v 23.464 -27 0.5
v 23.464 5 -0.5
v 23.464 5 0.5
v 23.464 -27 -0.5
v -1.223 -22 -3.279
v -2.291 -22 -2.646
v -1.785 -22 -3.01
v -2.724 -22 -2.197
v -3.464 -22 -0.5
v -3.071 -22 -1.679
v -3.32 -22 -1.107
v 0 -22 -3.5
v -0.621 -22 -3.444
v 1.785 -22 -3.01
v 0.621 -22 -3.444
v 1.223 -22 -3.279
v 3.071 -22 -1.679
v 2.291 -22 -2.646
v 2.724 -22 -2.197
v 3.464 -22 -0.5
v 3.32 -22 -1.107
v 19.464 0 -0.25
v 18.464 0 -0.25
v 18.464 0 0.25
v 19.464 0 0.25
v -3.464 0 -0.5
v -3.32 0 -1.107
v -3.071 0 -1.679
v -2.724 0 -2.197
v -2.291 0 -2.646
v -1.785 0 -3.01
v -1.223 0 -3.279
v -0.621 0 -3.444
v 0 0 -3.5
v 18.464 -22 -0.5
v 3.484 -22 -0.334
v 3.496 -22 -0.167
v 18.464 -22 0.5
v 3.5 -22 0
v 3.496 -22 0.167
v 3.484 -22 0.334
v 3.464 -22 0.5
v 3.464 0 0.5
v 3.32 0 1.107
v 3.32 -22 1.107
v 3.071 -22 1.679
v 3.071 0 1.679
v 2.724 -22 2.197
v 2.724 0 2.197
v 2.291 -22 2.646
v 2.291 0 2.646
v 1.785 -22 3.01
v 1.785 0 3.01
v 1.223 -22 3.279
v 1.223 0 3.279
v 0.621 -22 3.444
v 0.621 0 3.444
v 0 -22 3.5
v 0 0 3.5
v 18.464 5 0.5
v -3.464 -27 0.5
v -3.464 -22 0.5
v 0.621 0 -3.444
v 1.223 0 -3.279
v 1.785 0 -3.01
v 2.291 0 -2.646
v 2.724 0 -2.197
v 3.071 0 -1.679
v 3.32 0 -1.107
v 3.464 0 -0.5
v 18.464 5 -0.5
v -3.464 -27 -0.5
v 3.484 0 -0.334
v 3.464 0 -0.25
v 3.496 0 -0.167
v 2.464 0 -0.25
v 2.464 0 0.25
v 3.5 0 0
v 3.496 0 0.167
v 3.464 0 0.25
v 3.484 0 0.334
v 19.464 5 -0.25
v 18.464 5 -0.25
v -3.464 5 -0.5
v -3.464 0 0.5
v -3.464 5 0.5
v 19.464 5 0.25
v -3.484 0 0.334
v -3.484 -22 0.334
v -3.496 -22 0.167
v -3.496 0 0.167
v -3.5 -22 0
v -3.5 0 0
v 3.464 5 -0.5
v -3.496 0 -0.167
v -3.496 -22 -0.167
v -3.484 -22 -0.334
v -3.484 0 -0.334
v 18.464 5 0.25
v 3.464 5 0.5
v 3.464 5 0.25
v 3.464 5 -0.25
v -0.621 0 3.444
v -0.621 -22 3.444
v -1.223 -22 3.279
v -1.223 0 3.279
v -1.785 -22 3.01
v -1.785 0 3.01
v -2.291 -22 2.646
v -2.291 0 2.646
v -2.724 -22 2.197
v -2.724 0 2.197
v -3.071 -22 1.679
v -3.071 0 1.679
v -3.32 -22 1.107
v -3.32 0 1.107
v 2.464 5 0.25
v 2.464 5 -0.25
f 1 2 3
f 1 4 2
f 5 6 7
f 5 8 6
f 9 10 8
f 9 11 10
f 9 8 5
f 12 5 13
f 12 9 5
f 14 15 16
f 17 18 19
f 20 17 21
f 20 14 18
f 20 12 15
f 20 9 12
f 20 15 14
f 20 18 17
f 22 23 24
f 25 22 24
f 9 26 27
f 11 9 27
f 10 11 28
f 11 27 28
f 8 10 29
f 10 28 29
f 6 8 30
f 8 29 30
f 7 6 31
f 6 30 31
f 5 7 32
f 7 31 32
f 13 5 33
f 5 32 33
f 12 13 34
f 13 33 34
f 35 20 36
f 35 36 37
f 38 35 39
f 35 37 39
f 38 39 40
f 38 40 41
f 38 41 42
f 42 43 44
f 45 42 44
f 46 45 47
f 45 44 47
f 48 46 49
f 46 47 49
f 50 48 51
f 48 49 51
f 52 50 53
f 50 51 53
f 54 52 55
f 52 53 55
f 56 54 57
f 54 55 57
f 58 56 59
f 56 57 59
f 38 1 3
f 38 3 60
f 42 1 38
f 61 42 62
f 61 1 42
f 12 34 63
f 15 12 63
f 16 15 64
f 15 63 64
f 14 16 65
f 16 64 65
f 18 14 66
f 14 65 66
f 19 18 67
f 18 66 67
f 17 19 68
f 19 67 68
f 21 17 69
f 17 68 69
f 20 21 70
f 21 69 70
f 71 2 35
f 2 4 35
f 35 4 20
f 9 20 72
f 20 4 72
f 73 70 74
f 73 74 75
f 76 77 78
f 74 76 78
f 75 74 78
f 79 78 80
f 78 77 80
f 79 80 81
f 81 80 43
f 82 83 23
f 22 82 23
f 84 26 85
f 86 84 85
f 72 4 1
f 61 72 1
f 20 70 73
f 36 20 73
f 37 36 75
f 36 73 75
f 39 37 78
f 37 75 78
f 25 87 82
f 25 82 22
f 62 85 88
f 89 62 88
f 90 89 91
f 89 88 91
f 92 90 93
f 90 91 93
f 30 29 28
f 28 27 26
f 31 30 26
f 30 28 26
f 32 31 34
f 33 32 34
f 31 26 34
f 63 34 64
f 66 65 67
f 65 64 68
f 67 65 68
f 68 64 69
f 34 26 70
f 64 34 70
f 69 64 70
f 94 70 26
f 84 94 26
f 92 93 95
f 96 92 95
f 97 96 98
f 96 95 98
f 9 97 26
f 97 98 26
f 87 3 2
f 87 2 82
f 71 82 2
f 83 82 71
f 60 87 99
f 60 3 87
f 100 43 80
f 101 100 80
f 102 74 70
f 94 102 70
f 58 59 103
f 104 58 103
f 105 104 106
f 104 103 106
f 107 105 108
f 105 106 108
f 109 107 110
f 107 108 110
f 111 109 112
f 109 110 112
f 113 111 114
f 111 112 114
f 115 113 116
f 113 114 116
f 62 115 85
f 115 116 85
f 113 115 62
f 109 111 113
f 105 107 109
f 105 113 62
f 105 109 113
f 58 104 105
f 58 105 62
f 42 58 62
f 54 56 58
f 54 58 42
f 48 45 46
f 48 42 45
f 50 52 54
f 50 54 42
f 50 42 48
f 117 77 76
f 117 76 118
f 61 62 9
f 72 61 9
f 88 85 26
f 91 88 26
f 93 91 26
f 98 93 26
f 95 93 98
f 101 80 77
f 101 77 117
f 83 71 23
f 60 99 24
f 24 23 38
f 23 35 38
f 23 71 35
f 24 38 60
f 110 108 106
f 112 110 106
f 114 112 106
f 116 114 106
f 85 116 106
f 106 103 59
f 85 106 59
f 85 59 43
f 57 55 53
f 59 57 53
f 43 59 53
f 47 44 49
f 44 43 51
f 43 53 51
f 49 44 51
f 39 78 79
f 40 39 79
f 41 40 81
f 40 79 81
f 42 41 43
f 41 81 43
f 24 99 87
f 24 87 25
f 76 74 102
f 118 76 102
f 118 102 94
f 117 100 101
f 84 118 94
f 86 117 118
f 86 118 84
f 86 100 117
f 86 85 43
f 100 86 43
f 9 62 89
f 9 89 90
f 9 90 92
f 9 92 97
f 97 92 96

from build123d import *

# Parameters (mm, degrees)
F1_DEPTH  = 22
F3_DEPTH  = 5
F5_DEPTH  = 5
F7_DEPTH  = 25
F8_DEPTH  = 20
F9_W      = 5
F9_H      = 1
F10_DEPTH = 27
F11_W     = 5
F11_H     = 0.5
F12_DEPTH = 1
F13_W     = 5
F13_H     = 0.5
F14_DEPTH = 1


with BuildPart() as f1:
    # F0 (on Front) → F1 (new body)
    with BuildSketch(Plane.XZ):
        with BuildLine():
            ThreePointArc((0, -3.5), (2.4748737342, -2.4748737342), (3.5, 0))
            ThreePointArc((3.5, 0), (2.4748737342, 2.4748737342), (0, 3.5))
            ThreePointArc((0, 3.5), (-2.4748737342, 2.4748737342), (-3.5, 0))
            ThreePointArc((-3.5, 0), (-2.4748737342, -2.4748737342), (0, -3.5))
        make_face()
        with BuildLine():
            ThreePointArc((-3.5, 0), (-2.4748737342, 2.4748737342), (0, 3.5))
            Line((0, 3.5), (-3.5, 3.5))
            Line((-3.5, 3.5), (-3.5, 0))
        make_face()
        with BuildLine():
            Line((-3.5, -3.5), (0, -3.5))
            ThreePointArc((0, -3.5), (-2.4748737342, -2.4748737342), (-3.5, 0))
            Line((-3.5, 0), (-3.5, -3.5))
        make_face()
        with BuildLine():
            Line((3.5, -3.5), (3.5, 0))
            ThreePointArc((3.5, 0), (2.4748737342, -2.4748737342), (0, -3.5))
            Line((0, -3.5), (3.5, -3.5))
        make_face()
        with BuildLine():
            ThreePointArc((0, 3.5), (2.4748737342, 2.4748737342), (3.5, 0))
            Line((3.5, 0), (3.5, 3.5))
            Line((3.5, 3.5), (0, 3.5))
        make_face()
    extrude(amount=F1_DEPTH)

    # F2 (on face) → F3 (join)
    with BuildSketch(Plane.XZ.offset(22)):
        Polygon((3.4641016151, -0.5), (3.4641016151, 0.5), (0, 0.5), (-3.4641016151, 0.5), (-3.4641016151, -0.5), align=None)
    extrude(amount=F3_DEPTH)

    # F4 (on face) → F5 (join)
    with BuildSketch(Plane(origin=(0, 0, 0), x_dir=(-1, 0, 0), z_dir=(0, 1, 0))):
        Polygon((3.4641016151, -0.5), (3.4641016151, 0.5), (0, 0.5), (-3.4641016151, 0.5), (-3.4641016151, -0.5), (0, -0.5), align=None)
    extrude(amount=F5_DEPTH)

    # F6 (on face) → F7 (cut)
    with BuildSketch(Plane(origin=(0, 0, 0), x_dir=(-1, 0, 0), z_dir=(0, 1, 0))):
        with BuildLine():
            ThreePointArc((-3.4641016151, 0.5), (-2.2912878475, 2.6457513111), (0, 3.5))
            Line((0, 3.5), (-3.5, 3.5))
            Line((-3.5, 3.5), (-3.5, 0))
            ThreePointArc((-3.5, 0), (-3.491013868, 0.2506435188), (-3.4641016151, 0.5))
        make_face()
        with BuildLine():
            ThreePointArc((3.4641016151, 0.5), (3.491013868, 0.2506435188), (3.5, 0))
            Line((3.5, 0), (3.5, 3.5))
            Line((3.5, 3.5), (0, 3.5))
            ThreePointArc((0, 3.5), (2.2912878475, 2.6457513111), (3.4641016151, 0.5))
        make_face()
        with BuildLine():
            Line((-3.5, -3.5), (0, -3.5))
            ThreePointArc((0, -3.5), (-2.2912878475, -2.6457513111), (-3.4641016151, -0.5))
            ThreePointArc((-3.4641016151, -0.5), (-3.491013868, -0.2506435188), (-3.5, 0))
            Line((-3.5, 0), (-3.5, -3.5))
        make_face()
        with BuildLine():
            Line((3.5, -3.5), (3.5, 0))
            ThreePointArc((3.5, 0), (3.491013868, -0.2506435188), (3.4641016151, -0.5))
            ThreePointArc((3.4641016151, -0.5), (2.2912878475, -2.6457513111), (0, -3.5))
            Line((0, -3.5), (3.5, -3.5))
        make_face()
    extrude(amount=-F7_DEPTH, mode=Mode.SUBTRACT)

    # F8 (add): a face of the model
    f8_faces = [f1.faces().sort_by_distance(p)[0] for p in [
        (3.4641016151, -24.5, 0),
    ]]
    extrude(f8_faces, amount=F8_DEPTH)

    # F9 (on face) → F10 (join)
    with BuildSketch(Plane(origin=(0, -22, 0), x_dir=(-1, 0, 0), z_dir=(0, 1, 0))):
        with Locations((-20.9641016151, 0)):
            Rectangle(F9_W, F9_H)
    extrude(amount=F10_DEPTH)

    # F11 (on face) → F12 (cut)
    with BuildSketch(Plane(origin=(18.4641016151, 0, 0), x_dir=(0, -1, 0), z_dir=(-1, 0, 0))):
        with Locations((-2.5, 0)):
            Rectangle(F11_W, F11_H)
    extrude(amount=-F12_DEPTH, mode=Mode.SUBTRACT)

    # F13 (on face) → F14 (cut)
    with BuildSketch(Plane.YZ.offset(3.4641016151)):
        with Locations((2.5, 0)):
            Rectangle(F13_W, F13_H)
    extrude(amount=-F14_DEPTH, mode=Mode.SUBTRACT)


solid = f1.part
